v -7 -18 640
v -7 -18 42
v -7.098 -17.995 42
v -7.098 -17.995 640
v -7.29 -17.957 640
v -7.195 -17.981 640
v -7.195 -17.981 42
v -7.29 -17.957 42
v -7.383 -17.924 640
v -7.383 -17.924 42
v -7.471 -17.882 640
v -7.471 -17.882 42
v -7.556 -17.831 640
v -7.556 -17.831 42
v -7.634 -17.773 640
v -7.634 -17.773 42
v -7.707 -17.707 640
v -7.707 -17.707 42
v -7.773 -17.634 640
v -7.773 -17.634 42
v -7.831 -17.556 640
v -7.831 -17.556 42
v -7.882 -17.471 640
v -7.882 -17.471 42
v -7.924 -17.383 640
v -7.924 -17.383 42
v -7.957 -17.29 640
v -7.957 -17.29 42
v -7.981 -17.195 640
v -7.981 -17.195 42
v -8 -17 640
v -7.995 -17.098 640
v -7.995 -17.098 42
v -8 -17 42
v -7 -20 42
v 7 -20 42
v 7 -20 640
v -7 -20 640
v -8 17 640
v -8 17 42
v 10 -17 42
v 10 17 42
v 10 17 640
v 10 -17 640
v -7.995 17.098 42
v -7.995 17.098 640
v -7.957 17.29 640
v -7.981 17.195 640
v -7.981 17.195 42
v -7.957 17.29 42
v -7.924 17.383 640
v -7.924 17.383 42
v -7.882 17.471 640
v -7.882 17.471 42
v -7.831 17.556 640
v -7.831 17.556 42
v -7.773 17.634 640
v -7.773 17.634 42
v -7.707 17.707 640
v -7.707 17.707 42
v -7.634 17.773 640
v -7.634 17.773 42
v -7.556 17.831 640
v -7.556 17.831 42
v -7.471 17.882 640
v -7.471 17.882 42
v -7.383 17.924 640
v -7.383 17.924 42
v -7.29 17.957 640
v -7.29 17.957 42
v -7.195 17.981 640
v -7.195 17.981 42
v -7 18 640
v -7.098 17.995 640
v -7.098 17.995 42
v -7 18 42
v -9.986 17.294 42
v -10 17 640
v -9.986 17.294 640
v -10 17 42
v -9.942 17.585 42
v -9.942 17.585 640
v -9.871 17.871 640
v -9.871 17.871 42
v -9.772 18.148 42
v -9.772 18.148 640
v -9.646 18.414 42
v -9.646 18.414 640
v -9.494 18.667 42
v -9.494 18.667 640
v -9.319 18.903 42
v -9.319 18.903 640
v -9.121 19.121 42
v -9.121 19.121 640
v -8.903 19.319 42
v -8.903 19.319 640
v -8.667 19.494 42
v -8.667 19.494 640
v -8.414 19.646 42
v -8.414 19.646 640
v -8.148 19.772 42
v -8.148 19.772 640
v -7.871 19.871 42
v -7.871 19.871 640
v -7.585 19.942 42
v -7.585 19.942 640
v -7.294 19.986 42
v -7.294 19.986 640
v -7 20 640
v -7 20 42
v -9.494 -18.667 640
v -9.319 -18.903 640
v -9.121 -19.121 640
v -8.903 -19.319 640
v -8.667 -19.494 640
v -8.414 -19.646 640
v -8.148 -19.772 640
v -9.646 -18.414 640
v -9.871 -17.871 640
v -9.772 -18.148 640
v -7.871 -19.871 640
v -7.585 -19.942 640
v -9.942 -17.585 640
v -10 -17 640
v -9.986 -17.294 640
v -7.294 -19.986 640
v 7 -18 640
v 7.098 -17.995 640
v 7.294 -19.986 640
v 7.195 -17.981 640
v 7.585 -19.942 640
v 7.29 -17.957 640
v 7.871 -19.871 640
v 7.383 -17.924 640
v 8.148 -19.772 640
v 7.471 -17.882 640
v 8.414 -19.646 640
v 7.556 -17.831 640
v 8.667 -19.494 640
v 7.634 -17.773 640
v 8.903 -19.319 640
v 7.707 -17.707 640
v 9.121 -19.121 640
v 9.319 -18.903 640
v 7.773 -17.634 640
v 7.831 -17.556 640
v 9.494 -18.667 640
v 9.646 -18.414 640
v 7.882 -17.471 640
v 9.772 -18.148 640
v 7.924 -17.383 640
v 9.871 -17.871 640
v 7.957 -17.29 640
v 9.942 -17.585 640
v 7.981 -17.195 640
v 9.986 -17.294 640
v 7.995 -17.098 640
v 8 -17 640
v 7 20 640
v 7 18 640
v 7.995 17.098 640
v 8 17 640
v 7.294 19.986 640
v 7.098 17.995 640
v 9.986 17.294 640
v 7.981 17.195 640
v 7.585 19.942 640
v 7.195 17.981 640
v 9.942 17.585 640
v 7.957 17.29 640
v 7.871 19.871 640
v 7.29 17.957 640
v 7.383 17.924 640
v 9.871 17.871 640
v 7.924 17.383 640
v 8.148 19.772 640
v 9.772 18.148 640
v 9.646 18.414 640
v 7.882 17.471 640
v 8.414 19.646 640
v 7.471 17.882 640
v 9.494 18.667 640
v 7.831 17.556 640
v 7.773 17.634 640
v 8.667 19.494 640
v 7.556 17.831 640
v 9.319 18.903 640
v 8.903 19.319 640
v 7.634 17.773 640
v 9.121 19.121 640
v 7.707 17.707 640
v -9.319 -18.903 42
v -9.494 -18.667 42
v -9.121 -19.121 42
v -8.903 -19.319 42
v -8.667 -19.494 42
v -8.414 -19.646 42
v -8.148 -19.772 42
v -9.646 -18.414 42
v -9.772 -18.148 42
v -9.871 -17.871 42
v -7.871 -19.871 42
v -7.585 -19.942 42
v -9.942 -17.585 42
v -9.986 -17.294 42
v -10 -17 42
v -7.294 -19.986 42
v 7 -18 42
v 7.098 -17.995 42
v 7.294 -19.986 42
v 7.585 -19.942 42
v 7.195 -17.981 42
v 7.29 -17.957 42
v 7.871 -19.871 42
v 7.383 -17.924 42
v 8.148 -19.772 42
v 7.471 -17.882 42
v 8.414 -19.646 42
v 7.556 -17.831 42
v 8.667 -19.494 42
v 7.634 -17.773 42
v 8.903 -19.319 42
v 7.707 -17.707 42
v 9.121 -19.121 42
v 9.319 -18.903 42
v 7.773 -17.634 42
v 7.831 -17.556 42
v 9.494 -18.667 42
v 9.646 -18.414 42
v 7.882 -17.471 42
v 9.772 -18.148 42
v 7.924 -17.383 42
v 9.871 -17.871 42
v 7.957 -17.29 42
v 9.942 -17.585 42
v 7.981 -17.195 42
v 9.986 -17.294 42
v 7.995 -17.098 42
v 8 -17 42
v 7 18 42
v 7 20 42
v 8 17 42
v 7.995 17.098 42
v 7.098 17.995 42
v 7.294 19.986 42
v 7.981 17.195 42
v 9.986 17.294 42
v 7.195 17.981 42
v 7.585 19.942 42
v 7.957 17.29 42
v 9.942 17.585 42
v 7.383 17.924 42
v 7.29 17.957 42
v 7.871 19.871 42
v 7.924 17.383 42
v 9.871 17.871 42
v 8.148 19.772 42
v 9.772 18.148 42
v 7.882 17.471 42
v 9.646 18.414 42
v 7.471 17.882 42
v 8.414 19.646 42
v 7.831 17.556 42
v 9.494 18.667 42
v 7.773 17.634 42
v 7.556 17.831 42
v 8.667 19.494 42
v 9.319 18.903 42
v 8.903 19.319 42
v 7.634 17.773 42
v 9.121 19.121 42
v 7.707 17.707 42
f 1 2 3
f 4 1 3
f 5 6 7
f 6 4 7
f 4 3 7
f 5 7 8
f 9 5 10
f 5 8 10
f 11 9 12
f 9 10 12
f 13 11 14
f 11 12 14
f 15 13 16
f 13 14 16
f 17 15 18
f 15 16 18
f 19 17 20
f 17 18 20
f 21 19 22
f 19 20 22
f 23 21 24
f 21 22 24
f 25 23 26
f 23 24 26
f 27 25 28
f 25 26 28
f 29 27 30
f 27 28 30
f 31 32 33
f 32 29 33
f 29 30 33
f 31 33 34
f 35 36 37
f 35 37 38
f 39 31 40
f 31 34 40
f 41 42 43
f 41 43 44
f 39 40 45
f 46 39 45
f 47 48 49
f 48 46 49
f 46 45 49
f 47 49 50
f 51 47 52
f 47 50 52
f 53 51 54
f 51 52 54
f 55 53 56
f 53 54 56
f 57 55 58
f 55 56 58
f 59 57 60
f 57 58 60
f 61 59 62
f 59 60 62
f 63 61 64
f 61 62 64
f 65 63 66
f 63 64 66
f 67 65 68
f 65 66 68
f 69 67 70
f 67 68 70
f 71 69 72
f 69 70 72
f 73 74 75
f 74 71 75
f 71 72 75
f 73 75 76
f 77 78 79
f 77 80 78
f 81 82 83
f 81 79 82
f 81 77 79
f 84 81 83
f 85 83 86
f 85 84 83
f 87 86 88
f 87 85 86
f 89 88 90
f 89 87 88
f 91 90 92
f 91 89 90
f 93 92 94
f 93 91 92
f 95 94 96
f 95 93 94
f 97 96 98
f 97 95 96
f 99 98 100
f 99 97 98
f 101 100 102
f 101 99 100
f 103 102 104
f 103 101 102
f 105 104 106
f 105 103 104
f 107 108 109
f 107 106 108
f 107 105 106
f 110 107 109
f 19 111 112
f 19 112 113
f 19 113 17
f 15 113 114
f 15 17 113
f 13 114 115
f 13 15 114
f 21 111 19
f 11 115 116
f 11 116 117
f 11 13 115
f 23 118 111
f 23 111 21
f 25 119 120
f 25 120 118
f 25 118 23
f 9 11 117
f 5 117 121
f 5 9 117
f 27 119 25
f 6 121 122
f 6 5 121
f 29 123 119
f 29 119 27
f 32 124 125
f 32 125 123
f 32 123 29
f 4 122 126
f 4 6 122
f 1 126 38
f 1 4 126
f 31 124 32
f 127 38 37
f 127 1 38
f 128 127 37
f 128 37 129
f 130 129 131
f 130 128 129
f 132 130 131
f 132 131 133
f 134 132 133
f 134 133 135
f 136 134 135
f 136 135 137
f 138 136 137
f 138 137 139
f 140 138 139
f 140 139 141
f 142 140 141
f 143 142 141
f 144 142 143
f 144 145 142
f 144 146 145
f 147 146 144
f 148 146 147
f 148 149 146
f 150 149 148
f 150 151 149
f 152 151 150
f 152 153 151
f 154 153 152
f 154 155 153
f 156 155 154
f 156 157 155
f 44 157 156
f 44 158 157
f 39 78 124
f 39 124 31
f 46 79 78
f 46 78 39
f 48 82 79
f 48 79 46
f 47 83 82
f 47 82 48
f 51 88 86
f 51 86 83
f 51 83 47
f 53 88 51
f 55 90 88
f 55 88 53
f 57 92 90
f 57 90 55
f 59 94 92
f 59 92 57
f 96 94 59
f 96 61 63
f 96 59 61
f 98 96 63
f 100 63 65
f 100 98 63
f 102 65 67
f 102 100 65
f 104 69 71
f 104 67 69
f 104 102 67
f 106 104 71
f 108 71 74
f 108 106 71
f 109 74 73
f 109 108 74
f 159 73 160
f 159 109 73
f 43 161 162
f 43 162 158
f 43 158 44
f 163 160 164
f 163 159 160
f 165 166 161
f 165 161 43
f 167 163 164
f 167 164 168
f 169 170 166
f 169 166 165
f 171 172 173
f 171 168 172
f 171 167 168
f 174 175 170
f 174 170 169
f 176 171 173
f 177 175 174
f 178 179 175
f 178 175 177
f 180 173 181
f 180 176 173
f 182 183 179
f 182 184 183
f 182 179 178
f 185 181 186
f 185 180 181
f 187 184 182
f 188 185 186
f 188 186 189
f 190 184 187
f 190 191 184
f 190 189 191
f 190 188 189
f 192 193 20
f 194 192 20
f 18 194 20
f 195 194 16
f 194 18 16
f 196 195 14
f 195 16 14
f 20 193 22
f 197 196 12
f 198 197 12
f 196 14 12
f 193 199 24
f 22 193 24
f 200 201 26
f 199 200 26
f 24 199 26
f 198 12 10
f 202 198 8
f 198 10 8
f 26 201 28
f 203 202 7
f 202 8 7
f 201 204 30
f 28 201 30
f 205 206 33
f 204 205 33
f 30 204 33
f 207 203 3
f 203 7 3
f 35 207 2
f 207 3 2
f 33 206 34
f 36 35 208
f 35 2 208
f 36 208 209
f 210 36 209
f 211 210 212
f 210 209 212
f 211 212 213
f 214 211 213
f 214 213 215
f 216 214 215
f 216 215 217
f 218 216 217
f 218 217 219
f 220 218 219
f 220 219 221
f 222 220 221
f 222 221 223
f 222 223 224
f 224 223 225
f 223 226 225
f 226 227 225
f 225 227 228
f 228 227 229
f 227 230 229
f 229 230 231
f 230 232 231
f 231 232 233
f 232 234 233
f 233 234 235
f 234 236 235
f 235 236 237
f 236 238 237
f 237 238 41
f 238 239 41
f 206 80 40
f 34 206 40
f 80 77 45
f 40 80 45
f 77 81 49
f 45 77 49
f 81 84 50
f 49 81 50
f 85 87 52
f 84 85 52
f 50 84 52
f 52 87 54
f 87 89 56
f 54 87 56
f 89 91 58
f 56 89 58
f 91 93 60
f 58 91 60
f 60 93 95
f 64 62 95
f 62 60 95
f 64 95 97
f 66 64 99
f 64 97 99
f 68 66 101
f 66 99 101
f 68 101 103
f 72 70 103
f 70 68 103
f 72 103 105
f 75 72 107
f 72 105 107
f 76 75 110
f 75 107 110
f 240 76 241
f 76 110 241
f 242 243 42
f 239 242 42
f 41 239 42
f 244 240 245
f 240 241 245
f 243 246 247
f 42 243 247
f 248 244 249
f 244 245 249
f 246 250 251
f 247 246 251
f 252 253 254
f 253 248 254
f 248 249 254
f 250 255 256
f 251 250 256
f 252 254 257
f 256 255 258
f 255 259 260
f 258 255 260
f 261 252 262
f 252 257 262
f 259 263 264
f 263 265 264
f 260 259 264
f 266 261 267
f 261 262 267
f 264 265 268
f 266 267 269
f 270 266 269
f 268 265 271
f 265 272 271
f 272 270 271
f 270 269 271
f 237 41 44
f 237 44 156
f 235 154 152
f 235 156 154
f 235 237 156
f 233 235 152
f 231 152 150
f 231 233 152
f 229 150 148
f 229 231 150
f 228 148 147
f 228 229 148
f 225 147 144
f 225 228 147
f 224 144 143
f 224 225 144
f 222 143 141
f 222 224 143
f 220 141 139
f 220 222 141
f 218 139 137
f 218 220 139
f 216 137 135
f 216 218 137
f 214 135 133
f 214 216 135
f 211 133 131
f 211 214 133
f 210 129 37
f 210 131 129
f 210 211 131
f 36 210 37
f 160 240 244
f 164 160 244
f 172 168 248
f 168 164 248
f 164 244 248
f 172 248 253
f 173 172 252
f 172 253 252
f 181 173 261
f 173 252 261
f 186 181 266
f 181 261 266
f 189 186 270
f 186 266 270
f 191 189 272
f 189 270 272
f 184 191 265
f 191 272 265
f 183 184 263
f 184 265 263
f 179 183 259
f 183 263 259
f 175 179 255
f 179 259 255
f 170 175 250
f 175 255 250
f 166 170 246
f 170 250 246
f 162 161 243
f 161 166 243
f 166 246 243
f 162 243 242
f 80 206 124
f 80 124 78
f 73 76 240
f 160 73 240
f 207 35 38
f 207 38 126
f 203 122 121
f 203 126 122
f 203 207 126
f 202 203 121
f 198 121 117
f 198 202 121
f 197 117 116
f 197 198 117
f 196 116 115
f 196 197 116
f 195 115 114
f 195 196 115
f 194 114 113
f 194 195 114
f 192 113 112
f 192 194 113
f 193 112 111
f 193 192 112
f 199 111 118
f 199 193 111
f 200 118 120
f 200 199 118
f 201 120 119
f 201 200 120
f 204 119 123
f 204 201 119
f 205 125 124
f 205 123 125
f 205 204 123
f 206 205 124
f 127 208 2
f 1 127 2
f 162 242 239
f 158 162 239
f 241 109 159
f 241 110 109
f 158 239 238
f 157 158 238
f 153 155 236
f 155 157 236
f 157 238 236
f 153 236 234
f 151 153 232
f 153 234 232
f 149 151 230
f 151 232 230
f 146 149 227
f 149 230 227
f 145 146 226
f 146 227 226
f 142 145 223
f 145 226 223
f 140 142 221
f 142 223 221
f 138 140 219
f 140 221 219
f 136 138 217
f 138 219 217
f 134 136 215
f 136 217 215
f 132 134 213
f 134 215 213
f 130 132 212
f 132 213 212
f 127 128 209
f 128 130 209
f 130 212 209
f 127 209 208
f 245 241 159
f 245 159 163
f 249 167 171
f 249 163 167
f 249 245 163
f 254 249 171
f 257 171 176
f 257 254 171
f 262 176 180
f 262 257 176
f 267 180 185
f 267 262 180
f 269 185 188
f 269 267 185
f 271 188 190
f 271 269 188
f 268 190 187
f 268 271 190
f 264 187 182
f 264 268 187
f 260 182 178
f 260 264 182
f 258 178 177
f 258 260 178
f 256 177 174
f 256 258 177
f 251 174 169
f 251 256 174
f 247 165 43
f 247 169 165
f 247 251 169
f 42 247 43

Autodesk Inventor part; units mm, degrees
ref_plane "Start plane" through (0, 0, 42) normal (0, 0, 1) x (1, 0, 0)
ref_plane "End plane" through (0, 0, 640) normal (0, 0, 1) x (1, 0, 0)
sketch "Sketch" plane through (0, 0, 0) normal (0, 0, 1) x (1, 0, 0)
  line L0 (-10, -17) -> (-10, 17)
  line L1 (-7, 20) -> (7, 20)
  line L2 (10, 17) -> (10, -17)
  line L3 (7, -20) -> (-7, -20)
  arc A0 (-10, -17) -> (-7, -20) centre (-7, -17) ccw
  arc A1 (-7, 20) -> (-10, 17) centre (-7, 17) ccw
  arc A2 (10, 17) -> (7, 20) centre (7, 17) ccw
  arc A3 (7, -20) -> (10, -17) centre (7, -17) ccw
  arc A4 (-7, 18) -> (-8, 17) centre (-7, 17) ccw
  line L4 (-7, 18) -> (7, 18)
  arc A5 (8, 17) -> (7, 18) centre (7, 17) ccw
  line L5 (8, 17) -> (8, -17)
  arc A6 (7, -18) -> (8, -17) centre (7, -17) ccw
  line L6 (7, -18) -> (-7, -18)
  arc A7 (-8, -17) -> (-7, -18) centre (-7, -17) ccw
  line L7 (-8, -17) -> (-8, 17)
  line L8 (0, 28.8698) -> (0, -28.8698) construction
  line L9 (-14.8698, 0) -> (14.8698, 0) construction
  dimension "d7" = 3
  dimension "d10" = 40
  dimension "d11" = 20
  dimension "d12" = 2
  dimension "d15" = 20
  dimension "d16" = 10
extrude "Body" add sketch "Sketch" along normal up to surface (598 mm away) from surface at 42
sketch "Sketch3" plane through (0, 0, 0) normal (0, 0, 1) x (1, 0, 0)
  line L0 (0, 0) -> (10, 0)
ref_plane "Work Plane3" through (0, 0, 0) normal (0, -1, 0) x (1, 0, 0)
sketch "Sketch4" plane through (0, 0, 0) normal (0, -1, 0) x (1, 0, 0)
  line L0 (-2, 42) -> (12, 42)
  line L1 (-2, 640) -> (12, 640)
  dimension "d18" = 598
ref_plane "Work Plane4" through (-1510, -17, 42) normal (0, 0, -1) x (-1, 0, 0)
split "Split1" plane through (-1510, -17, 42) removes the side toward (0, 0, -1)
equation "\"d7\" = G_IR"
equation "\"d10\" = G_H"
equation "\"d11\" = G_W"
equation "\"d12\" = G_T"
equation "\"d15\" = 0.5 * d10"
equation "\"d16\" = 0.5 * d11"
equation "\"d3\" = G_L"
equation "\"G_W\" = 20"
equation "\"G_H\" = 40"
equation "\"G_T\" = 2"
equation "\"G_IR\" = 3"
equation "\"G_L\" = d18"
equation "\"G_OFFSET_START\" = -42"
equation "\"G_OFFSET_END\" = 0"
equation "\"d13\" = -G_OFFSET_START"
equation "\"d14\" = G_OFFSET_END + B_L"
equation "\"B_L\" = 640"
properties part number "UNI EN 10305-5 - 40 x 20 x 2  - 598" material "Steel, Mild"
